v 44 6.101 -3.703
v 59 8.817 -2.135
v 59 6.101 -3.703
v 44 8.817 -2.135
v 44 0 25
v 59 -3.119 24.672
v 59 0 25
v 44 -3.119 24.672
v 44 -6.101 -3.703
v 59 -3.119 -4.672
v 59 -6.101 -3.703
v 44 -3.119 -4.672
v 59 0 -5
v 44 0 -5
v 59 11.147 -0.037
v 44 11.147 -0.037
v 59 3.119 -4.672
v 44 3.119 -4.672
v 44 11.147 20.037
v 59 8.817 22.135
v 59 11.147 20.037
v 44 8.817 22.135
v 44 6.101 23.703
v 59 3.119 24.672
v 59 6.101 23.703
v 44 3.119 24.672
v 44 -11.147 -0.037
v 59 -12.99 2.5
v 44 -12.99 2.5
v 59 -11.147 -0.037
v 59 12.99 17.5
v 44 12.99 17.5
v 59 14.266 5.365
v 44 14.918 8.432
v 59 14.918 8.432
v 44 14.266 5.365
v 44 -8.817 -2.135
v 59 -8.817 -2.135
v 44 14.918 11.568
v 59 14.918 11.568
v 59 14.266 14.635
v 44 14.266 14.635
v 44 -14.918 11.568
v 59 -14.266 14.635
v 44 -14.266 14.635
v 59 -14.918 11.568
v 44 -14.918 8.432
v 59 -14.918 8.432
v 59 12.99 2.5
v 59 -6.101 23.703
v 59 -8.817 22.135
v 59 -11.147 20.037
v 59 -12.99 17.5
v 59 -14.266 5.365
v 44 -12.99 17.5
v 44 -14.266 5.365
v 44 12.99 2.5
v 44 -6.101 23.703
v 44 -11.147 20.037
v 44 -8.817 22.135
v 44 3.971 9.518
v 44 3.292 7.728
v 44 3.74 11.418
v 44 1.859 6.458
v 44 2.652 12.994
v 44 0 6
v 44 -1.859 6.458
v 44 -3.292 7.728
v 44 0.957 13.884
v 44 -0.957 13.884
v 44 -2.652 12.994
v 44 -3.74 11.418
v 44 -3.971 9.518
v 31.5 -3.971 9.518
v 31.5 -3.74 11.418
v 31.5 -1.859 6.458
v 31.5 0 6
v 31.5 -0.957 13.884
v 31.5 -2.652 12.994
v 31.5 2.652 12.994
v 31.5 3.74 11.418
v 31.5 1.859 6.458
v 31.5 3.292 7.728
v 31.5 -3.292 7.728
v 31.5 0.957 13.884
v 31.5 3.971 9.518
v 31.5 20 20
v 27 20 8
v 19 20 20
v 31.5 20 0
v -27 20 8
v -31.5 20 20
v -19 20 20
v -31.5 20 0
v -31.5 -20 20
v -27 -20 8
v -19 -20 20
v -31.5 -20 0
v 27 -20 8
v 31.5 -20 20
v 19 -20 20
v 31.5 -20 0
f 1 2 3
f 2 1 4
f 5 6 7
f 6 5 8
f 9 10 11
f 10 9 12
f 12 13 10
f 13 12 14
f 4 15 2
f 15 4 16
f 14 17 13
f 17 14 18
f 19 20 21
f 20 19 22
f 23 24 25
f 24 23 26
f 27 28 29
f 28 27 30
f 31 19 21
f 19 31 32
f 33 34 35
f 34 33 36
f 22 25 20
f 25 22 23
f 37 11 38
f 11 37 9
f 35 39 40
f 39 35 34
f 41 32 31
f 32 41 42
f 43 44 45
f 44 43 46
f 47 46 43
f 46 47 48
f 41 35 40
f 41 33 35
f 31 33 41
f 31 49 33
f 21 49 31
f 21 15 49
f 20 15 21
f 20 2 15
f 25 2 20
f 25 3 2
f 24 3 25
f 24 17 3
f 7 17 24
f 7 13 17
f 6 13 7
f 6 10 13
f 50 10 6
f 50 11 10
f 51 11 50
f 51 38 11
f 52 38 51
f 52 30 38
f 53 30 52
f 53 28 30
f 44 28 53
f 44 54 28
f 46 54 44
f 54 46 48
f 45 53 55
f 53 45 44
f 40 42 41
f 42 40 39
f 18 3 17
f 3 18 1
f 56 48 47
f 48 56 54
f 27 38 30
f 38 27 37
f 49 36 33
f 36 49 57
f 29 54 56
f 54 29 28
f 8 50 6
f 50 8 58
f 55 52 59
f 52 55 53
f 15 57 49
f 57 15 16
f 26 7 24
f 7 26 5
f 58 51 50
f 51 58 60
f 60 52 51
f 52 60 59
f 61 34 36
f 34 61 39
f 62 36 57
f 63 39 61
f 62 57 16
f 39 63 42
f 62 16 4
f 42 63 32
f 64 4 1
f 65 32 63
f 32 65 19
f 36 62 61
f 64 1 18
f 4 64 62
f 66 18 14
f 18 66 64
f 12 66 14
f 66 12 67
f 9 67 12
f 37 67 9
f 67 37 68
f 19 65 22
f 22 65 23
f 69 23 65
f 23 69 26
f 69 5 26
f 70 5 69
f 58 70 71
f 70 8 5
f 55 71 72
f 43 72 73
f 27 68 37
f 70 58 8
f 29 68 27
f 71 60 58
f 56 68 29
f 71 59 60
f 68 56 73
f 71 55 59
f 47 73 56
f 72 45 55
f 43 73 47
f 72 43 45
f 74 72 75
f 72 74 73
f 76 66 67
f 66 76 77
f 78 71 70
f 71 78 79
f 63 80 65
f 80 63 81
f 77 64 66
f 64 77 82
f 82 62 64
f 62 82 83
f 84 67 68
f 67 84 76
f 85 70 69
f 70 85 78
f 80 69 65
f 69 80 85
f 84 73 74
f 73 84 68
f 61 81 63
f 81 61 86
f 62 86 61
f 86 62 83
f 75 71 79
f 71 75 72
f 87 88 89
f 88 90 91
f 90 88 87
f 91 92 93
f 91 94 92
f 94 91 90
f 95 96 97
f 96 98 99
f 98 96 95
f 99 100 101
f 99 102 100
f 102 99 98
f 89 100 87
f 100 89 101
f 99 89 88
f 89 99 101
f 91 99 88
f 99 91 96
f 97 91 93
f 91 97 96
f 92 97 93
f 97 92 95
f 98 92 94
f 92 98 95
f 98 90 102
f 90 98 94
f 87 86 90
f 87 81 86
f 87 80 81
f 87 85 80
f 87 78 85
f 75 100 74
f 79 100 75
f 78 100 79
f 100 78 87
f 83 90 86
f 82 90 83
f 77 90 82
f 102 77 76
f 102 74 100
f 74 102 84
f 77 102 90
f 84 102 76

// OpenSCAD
//模块 -  安装望远镜的鸠尾槽
tail_for_telescope_width=63;
tail_for_telescope_thickness=20;
tail_for_telescope_cut1_length=38;
tail_for_telescope_cut2_length=54;
tail_for_telescope_cut3_thickness=8;


dovetail_saddle(40,1);
module dovetail_saddle(tail_for_telescope_length,position){
    
    if(position==1){
    //旋转把手
    translate([tail_for_telescope_width/2+20,0,tail_for_telescope_thickness/2])
    rotate([0,90,0])
    cylinder(h=15,d=30,center=true);
    
        translate([tail_for_telescope_width/2-5+10,0,tail_for_telescope_thickness/2])
    rotate([0,90,0])
    cylinder(h=15,d=8,center=true);}
    else
    {
          //旋转把手
    translate([-tail_for_telescope_width/2-20,tail_for_telescope_length/4,tail_for_telescope_thickness/2])
    rotate([0,90,0])
    cylinder(h=15,d=30,center=true);
    
        translate([-tail_for_telescope_width/2-5,tail_for_telescope_length/4,tail_for_telescope_thickness/2])
    rotate([0,90,0])
    cylinder(h=15,d=8,center=true);  
        
        translate([-tail_for_telescope_width/2-20,-tail_for_telescope_length/4,tail_for_telescope_thickness/2])
    rotate([0,90,0])
    cylinder(h=15,d=30,center=true);
    
        translate([-tail_for_telescope_width/2-5,-tail_for_telescope_length/4,tail_for_telescope_thickness/2])
    rotate([0,90,0])
    cylinder(h=15,d=8,center=true);  
        }
    
    //槽面
    color("silver")
    translate([-tail_for_telescope_width/2,tail_for_telescope_length/2,])
    rotate([90,0,0])
linear_extrude(tail_for_telescope_length)
 polygon(points=[[0,0],[tail_for_telescope_width,0],
 
 //右上角
 [tail_for_telescope_width,tail_for_telescope_thickness],
 [tail_for_telescope_width-(tail_for_telescope_width-tail_for_telescope_cut1_length)/2,tail_for_telescope_thickness],
 
  [tail_for_telescope_width-(tail_for_telescope_width-tail_for_telescope_cut2_length)/2,tail_for_telescope_cut3_thickness],
  
    [(tail_for_telescope_width-tail_for_telescope_cut2_length)/2,tail_for_telescope_cut3_thickness],
    
    
     [(tail_for_telescope_width-tail_for_telescope_cut1_length)/2,tail_for_telescope_thickness],
 //左上角
  [0,tail_for_telescope_thickness],
 ]);}
